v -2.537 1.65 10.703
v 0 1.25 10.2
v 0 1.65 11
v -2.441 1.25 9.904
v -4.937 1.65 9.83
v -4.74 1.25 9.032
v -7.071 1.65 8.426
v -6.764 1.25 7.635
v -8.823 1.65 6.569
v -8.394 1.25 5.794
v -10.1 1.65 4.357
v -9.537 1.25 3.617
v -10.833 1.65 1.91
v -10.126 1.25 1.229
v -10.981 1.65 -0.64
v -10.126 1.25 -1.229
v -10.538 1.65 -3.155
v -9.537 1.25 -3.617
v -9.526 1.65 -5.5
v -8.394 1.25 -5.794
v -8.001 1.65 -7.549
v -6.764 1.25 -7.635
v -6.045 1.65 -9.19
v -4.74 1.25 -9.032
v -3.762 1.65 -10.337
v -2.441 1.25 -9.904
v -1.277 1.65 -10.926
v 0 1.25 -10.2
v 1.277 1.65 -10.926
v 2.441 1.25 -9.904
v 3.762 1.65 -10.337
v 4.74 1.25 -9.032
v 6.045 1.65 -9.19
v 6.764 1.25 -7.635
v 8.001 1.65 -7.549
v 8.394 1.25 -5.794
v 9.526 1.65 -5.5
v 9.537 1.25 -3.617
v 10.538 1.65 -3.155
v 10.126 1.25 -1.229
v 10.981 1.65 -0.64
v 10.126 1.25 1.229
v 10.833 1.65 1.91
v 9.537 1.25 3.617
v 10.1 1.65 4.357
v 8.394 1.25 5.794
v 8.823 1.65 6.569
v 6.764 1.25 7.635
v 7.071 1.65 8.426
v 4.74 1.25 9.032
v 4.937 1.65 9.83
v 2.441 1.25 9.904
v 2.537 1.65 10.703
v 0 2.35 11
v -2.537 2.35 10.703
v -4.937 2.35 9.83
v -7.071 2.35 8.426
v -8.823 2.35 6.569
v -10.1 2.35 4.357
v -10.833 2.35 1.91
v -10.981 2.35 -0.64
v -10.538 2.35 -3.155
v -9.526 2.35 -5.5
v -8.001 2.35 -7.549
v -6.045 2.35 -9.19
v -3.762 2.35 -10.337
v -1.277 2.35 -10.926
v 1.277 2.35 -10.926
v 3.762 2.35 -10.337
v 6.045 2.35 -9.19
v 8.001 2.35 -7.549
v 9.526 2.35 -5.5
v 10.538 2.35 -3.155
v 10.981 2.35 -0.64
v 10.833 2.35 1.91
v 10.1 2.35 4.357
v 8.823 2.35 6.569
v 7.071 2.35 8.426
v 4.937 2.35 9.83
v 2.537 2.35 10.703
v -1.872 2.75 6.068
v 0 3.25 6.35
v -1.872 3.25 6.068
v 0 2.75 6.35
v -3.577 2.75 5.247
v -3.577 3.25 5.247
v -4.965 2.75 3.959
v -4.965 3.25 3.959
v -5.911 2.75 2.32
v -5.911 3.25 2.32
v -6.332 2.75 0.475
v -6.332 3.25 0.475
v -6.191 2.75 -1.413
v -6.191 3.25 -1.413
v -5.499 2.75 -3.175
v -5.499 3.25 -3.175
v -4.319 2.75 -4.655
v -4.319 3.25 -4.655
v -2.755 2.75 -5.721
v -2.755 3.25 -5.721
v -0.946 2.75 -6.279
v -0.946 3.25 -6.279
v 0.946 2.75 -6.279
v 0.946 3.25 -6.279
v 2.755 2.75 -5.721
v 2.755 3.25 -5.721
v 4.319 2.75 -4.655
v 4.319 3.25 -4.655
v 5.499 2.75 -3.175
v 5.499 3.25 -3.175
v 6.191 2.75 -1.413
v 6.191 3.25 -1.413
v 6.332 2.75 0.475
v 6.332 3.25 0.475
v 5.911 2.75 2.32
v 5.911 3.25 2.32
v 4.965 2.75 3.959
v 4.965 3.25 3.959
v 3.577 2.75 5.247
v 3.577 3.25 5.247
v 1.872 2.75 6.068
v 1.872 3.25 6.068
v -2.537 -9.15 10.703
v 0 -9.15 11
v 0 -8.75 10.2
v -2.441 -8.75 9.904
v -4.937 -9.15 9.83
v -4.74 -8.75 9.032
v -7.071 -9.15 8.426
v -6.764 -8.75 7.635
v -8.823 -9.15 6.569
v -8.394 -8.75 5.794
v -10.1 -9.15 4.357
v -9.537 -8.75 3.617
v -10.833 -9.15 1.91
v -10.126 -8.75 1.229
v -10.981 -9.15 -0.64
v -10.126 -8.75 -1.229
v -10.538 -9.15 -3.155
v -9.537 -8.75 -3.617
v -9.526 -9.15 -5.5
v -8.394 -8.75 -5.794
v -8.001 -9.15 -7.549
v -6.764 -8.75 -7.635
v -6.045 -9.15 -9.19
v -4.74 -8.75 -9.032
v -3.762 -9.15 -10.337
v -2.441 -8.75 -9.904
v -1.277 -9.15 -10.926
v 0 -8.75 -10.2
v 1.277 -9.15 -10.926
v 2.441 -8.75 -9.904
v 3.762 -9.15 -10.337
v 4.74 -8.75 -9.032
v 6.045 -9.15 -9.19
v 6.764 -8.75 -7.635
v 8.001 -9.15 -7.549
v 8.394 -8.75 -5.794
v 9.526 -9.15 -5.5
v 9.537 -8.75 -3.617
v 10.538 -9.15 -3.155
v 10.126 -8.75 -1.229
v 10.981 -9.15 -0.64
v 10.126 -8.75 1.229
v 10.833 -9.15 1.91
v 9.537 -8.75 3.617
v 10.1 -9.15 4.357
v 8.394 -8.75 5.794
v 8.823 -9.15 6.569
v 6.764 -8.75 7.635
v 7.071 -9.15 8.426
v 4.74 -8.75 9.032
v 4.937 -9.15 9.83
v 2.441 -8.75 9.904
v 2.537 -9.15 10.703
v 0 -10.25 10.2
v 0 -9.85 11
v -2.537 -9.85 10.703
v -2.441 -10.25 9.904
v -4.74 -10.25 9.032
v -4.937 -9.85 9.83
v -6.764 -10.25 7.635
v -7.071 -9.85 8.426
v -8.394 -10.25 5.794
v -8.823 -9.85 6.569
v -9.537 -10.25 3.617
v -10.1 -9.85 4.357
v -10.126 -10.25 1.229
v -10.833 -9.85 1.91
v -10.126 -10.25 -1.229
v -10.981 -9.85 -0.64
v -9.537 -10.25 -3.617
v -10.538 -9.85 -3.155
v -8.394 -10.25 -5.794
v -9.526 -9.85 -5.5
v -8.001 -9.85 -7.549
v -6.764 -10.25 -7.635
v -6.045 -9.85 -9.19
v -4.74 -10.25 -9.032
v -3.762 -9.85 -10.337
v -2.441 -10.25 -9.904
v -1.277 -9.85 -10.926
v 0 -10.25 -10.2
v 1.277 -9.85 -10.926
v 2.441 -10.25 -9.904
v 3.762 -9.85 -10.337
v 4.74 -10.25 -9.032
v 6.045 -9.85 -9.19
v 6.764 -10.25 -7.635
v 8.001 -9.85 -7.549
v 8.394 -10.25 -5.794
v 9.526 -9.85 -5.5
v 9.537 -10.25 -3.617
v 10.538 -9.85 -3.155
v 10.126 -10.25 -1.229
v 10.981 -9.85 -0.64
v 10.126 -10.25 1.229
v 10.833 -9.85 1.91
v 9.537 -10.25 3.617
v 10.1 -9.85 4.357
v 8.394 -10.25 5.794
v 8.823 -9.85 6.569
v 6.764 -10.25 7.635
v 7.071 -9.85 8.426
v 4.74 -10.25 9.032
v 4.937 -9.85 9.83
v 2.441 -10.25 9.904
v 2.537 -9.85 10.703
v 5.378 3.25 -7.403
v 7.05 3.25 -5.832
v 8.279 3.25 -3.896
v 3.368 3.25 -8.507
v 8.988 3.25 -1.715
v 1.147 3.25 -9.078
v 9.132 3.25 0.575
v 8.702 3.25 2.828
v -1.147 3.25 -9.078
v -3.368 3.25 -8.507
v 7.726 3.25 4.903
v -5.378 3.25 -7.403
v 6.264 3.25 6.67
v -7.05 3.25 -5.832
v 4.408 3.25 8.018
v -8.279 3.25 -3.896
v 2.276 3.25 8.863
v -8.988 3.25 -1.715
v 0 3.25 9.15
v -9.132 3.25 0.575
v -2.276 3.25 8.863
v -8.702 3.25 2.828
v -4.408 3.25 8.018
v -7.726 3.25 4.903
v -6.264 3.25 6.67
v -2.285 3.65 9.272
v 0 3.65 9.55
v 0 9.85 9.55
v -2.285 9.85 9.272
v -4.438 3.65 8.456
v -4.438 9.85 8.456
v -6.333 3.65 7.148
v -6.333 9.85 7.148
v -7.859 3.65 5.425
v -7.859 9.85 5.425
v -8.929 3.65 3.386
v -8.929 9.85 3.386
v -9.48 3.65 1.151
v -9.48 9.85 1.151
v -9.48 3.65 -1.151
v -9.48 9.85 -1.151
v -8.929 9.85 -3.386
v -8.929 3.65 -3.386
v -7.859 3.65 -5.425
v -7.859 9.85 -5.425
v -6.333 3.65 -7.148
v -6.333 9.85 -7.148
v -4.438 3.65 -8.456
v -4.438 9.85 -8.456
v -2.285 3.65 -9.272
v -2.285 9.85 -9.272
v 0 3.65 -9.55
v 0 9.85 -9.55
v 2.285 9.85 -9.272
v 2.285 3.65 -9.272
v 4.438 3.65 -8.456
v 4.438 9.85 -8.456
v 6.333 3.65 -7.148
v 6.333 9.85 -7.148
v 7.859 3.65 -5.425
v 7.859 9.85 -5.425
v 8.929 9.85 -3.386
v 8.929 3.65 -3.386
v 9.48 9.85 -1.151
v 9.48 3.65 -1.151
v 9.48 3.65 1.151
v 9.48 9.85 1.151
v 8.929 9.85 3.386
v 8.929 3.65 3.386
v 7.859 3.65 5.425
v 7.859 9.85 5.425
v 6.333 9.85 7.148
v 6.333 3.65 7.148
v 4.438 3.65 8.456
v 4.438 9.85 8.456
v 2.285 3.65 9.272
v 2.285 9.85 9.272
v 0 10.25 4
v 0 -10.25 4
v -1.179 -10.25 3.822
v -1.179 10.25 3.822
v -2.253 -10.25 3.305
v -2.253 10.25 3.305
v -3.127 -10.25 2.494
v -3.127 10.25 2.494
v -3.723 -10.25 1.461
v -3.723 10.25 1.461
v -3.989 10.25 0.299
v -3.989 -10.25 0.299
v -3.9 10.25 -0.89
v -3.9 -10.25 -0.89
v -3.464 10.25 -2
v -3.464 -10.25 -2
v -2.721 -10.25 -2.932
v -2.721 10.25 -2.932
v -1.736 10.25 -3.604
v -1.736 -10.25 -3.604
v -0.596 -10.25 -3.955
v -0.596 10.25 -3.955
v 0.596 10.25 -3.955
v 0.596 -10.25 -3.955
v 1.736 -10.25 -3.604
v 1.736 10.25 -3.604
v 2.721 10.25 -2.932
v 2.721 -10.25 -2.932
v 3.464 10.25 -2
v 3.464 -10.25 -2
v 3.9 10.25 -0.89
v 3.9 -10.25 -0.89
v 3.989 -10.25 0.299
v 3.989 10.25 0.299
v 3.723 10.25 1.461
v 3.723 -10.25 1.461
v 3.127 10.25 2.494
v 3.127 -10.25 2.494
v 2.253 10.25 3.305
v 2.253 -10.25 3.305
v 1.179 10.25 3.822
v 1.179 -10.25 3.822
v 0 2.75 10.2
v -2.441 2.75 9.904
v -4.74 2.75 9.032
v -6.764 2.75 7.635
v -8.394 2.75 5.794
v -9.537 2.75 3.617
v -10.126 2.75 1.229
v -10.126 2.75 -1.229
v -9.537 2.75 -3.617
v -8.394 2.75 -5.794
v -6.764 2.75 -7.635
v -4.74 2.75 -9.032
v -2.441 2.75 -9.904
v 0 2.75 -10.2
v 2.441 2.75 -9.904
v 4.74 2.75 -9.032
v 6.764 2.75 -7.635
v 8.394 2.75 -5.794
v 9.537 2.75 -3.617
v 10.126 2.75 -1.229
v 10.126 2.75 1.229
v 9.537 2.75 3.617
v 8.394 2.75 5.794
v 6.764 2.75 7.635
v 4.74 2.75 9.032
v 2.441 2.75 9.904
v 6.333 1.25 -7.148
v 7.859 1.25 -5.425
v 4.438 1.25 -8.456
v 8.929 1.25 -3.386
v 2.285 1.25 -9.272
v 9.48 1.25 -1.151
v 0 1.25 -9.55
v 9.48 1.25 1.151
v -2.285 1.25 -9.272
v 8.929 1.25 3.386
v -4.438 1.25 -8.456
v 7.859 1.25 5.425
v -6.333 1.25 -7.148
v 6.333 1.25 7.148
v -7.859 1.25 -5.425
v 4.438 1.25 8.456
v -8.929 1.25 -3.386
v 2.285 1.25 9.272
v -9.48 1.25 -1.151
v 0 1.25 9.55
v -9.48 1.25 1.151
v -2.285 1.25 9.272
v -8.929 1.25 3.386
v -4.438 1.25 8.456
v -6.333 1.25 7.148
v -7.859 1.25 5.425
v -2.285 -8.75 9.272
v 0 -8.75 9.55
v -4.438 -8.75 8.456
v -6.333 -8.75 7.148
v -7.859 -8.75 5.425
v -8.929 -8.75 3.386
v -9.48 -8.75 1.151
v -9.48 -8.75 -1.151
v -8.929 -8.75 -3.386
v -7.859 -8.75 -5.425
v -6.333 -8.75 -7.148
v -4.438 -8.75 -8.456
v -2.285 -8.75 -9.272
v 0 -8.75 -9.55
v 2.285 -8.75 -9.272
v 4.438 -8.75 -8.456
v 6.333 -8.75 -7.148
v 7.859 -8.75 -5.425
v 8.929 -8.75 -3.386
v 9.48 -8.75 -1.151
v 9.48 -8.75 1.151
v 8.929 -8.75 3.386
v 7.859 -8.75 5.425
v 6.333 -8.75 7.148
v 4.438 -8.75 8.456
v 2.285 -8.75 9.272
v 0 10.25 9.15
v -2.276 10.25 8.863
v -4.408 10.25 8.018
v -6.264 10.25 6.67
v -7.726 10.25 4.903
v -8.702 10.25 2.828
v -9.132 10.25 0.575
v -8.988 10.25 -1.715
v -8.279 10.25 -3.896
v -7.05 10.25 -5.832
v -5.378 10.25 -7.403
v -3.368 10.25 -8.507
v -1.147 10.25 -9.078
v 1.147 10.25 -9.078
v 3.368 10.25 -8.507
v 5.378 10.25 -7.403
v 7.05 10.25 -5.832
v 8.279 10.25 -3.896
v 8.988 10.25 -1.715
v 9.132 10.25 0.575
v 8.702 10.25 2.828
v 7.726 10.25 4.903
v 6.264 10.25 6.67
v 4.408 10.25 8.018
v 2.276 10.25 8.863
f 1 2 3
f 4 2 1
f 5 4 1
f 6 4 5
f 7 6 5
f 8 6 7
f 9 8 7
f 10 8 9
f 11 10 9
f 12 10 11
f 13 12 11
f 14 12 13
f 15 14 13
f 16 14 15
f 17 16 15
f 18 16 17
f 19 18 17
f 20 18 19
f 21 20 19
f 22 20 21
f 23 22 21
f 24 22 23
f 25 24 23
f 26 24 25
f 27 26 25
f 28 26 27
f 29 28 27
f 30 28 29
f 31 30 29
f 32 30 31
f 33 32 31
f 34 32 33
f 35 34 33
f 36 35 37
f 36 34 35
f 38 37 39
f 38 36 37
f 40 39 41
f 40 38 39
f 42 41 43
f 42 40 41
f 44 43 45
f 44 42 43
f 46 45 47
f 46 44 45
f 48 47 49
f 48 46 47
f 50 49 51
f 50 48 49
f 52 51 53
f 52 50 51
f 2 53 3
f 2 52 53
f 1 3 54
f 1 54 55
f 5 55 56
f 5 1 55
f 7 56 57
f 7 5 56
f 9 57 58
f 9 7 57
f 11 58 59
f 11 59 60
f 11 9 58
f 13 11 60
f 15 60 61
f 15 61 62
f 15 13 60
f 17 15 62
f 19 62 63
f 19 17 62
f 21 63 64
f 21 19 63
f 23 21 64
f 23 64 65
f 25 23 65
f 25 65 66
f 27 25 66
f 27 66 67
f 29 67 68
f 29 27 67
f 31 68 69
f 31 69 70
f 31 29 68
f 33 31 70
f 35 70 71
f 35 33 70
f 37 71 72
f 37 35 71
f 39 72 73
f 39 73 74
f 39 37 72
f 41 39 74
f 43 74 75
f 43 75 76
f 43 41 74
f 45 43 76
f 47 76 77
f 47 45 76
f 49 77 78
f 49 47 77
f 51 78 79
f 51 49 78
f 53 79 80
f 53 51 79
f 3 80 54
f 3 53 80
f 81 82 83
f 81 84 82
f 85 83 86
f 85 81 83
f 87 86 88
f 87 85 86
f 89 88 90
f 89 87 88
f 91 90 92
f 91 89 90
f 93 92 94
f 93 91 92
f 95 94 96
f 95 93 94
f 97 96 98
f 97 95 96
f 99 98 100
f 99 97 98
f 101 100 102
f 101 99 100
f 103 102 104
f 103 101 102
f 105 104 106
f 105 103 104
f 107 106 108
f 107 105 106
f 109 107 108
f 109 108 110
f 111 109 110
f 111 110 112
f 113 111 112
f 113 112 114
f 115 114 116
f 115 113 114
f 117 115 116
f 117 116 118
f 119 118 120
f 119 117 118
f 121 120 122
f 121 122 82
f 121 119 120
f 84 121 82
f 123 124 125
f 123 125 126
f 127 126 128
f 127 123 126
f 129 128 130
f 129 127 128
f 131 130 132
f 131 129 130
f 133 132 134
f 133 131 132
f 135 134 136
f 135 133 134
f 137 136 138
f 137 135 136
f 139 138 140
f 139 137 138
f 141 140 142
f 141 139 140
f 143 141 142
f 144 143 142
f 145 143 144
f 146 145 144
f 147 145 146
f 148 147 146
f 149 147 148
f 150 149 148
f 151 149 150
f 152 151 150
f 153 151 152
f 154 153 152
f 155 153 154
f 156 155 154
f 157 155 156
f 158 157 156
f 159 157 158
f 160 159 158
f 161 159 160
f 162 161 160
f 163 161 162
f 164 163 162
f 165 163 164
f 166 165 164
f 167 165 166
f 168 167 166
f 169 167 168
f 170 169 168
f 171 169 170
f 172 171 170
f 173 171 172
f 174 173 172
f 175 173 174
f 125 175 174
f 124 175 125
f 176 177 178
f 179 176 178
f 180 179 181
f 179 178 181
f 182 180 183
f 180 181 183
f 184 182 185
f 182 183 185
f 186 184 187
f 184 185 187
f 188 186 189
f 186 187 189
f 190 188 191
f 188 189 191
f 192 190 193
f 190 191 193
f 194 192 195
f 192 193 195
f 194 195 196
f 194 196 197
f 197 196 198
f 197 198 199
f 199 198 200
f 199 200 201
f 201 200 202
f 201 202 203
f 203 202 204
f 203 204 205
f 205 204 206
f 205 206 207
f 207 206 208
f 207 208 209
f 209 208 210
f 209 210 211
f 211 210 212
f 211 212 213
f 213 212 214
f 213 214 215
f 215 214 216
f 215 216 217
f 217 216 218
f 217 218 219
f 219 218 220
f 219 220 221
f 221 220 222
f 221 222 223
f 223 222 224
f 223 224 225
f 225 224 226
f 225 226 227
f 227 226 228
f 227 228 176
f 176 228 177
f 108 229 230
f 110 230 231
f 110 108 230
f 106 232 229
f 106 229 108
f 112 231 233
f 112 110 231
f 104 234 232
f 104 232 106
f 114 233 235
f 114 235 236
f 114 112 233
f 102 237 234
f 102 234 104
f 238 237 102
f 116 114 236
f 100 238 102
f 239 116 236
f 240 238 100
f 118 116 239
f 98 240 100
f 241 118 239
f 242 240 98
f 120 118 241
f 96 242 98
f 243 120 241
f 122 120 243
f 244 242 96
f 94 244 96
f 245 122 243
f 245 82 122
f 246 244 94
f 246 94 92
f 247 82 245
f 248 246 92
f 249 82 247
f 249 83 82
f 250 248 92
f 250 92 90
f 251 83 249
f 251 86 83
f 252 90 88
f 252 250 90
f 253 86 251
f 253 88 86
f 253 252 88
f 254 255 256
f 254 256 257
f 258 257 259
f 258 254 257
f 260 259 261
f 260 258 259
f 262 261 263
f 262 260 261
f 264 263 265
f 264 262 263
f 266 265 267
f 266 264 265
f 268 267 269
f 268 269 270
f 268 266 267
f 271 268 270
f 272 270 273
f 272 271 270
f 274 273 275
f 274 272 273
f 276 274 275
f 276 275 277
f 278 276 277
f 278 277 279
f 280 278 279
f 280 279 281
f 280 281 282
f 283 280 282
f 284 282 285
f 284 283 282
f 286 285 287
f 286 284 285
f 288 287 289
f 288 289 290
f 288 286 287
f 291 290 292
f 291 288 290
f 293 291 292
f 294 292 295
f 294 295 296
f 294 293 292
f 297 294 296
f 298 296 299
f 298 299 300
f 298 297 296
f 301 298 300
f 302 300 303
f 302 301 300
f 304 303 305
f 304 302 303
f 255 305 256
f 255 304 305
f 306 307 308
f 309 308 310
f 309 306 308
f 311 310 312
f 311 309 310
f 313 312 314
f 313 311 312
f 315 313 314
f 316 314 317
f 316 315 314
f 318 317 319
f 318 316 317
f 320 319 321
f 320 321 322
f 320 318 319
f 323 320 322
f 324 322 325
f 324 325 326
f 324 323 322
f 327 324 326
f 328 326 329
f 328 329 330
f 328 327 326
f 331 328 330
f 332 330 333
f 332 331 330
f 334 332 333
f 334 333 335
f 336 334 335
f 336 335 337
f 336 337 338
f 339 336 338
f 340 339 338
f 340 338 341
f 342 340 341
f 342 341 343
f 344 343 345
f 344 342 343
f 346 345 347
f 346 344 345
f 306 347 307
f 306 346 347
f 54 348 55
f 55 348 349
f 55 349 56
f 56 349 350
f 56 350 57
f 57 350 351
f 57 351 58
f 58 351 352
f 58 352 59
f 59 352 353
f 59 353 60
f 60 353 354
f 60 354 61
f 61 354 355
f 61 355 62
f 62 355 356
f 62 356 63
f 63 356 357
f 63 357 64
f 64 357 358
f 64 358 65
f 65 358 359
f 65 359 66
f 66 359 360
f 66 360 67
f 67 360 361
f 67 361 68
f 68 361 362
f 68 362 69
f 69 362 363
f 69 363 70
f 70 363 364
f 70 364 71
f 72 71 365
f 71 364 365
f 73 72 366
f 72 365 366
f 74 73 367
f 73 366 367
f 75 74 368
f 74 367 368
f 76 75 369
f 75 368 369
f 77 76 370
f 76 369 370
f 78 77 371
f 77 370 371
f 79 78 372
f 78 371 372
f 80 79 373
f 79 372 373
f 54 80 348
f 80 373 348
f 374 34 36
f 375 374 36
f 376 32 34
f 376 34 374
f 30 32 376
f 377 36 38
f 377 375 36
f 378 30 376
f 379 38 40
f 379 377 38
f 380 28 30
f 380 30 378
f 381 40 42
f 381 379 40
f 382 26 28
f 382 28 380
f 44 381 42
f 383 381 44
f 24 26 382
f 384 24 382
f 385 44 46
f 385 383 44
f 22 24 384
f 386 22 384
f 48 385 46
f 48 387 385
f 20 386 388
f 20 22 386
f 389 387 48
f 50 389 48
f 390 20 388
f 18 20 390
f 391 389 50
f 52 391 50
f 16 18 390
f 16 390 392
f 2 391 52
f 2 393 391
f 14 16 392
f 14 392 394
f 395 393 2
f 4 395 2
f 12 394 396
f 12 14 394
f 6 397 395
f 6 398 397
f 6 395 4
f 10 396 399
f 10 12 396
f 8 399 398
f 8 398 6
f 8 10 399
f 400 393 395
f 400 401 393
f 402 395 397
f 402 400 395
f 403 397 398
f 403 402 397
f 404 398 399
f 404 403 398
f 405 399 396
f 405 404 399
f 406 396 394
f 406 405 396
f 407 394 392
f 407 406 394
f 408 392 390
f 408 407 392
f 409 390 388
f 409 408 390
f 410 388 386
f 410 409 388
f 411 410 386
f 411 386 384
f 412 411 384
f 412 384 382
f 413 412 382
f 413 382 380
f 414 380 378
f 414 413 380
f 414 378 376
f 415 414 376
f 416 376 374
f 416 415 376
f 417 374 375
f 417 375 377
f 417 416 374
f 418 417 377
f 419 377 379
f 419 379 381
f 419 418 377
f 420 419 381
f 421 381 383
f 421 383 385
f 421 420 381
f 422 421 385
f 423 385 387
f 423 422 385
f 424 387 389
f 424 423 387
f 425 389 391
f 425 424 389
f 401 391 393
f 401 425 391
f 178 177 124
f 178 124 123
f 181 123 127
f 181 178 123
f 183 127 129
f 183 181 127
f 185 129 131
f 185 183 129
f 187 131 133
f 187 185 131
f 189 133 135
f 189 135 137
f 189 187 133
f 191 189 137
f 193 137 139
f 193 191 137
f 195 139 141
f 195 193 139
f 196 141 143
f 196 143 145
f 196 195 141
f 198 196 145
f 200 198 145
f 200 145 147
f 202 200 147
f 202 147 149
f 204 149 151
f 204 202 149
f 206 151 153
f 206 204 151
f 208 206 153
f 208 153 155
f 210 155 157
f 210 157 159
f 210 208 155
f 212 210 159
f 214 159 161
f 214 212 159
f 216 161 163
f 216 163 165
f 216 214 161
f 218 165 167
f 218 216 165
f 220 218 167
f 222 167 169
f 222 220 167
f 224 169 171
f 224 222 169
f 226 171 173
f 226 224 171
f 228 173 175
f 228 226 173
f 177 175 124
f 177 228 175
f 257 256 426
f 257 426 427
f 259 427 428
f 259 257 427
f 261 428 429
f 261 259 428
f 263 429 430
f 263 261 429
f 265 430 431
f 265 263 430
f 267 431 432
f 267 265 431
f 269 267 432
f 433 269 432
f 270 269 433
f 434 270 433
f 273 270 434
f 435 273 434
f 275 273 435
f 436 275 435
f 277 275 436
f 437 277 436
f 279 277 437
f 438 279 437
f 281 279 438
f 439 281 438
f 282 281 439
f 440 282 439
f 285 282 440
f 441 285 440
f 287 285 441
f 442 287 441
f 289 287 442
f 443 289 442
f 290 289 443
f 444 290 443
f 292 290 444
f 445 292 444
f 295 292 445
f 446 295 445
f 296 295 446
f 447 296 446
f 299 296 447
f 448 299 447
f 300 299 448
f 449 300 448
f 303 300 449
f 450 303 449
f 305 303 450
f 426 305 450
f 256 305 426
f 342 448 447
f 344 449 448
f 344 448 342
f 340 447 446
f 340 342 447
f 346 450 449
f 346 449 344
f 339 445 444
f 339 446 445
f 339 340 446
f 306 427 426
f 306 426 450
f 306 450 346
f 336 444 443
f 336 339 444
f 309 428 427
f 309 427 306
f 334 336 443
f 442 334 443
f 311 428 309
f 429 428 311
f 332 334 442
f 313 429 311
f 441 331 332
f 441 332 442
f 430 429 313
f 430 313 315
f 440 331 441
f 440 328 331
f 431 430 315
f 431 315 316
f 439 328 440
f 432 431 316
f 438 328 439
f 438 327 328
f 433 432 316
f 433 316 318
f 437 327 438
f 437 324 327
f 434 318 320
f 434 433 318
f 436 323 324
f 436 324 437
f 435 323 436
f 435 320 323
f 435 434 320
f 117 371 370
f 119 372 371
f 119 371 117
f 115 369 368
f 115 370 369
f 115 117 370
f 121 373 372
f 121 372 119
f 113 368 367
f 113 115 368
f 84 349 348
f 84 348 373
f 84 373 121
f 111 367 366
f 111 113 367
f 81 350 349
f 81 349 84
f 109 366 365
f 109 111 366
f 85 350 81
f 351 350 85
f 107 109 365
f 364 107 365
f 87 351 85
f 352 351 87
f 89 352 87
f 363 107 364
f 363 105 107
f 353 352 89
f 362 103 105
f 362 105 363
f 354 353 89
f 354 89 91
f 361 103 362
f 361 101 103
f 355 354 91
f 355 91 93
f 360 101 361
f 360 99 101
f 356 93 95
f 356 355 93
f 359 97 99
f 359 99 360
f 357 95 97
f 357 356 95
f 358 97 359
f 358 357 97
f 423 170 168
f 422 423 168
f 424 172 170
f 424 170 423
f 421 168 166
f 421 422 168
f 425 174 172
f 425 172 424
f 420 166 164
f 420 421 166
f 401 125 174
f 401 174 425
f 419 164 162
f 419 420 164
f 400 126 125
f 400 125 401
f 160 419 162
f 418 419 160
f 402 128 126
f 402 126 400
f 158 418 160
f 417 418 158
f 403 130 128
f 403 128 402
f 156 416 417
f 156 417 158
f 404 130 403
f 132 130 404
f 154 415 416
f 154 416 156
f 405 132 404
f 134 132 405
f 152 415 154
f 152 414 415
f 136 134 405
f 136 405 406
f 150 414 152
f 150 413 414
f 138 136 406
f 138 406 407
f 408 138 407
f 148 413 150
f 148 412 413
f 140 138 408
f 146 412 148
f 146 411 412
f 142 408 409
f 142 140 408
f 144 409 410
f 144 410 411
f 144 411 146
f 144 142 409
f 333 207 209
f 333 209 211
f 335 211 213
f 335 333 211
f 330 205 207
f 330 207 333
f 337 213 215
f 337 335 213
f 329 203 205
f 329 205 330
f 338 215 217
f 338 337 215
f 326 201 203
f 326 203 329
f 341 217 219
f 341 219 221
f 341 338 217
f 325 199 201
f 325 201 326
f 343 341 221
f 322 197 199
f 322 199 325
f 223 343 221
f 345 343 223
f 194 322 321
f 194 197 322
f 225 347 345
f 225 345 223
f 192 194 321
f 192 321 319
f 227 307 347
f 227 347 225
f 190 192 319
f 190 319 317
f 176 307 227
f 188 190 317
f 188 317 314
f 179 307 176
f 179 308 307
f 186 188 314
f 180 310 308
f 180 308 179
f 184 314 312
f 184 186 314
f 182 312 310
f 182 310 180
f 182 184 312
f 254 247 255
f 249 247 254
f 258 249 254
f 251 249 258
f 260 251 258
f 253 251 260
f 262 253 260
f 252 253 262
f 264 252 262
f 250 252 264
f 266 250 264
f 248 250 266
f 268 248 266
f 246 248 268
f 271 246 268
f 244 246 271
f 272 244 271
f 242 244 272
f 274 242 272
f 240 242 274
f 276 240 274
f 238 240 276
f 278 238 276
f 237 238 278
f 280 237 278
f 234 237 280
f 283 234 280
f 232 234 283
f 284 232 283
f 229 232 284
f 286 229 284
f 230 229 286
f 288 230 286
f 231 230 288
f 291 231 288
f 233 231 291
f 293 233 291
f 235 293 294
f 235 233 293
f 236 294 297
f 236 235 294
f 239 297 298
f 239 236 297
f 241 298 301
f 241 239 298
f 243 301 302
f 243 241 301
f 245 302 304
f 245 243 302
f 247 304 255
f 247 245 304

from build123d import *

# Parameters (mm, degrees)
F2_C1_SIZE2 = 0.4
F2_C1_SIZE  = 0.8
F2_C2_SIZE2 = 0.8
F2_C2_SIZE  = 0.4
F2_C3_SIZE2 = 0.8
F2_C3_SIZE  = 0.4
F3_SIZE2    = 0.4
F3_SIZE     = 0.8
F4_SIZE     = 0.4


with BuildPart() as f1:
    # F0 (on Right) → F1 (revolve)
    with BuildSketch(Plane.YZ):
        Polygon((-10.25, 11), (-10.25, 4), (10.25, 4), (10.25, 9.55), (3.25, 9.55), (3.25, 6.35), (2.75, 6.35), (2.75, 11), (1.25, 11), (1.25, 9.55), (-8.75, 9.55), (-8.75, 11), align=None)
    revolve(axis=Axis((0, -3.1587743408, 0), (0, -1, 0)))

    # F2: chamfer of 0.4 x 0.8 on 3 edges, made by hand

    # F2_c1
    f2_c1_edges = [f1.edges().sort_by_distance(p)[0] for p in [
        (0, -10.25, -11),
    ]]
    f2_c1_side = f1.faces().sort_by_distance((0, -10.25, -10.992))[0]
    chamfer(f2_c1_edges, length=F2_C1_SIZE, length2=F2_C1_SIZE2, reference=f2_c1_side)

    # F2_c2
    f2_c2_edges = [f1.edges().sort_by_distance(p)[0] for p in [
        (0, 2.75, -11),
    ]]
    f2_c2_side = f1.faces().sort_by_distance((0, 2.742, -11))[0]
    chamfer(f2_c2_edges, length=F2_C2_SIZE, length2=F2_C2_SIZE2, reference=f2_c2_side)

    # F2_c3
    f2_c3_edges = [f1.edges().sort_by_distance(p)[0] for p in [
        (0, 1.25, -11),
    ]]
    f2_c3_side = f1.faces().sort_by_distance((0, 1.258, -11))[0]
    chamfer(f2_c3_edges, length=F2_C3_SIZE, length2=F2_C3_SIZE2, reference=f2_c3_side)

    # F3
    f3_edges = [f1.edges().sort_by_distance(p)[0] for p in [
        (0, -8.75, -11),
    ]]
    chamfer(f3_edges, length=F3_SIZE, length2=F3_SIZE2)

    # F4
    f4_edges = [f1.edges().sort_by_distance(p)[0] for p in [
        (0, 3.25, -9.55),
        (0, 10.25, -9.55),
    ]]
    chamfer(f4_edges, length=F4_SIZE)


solid = f1.part
